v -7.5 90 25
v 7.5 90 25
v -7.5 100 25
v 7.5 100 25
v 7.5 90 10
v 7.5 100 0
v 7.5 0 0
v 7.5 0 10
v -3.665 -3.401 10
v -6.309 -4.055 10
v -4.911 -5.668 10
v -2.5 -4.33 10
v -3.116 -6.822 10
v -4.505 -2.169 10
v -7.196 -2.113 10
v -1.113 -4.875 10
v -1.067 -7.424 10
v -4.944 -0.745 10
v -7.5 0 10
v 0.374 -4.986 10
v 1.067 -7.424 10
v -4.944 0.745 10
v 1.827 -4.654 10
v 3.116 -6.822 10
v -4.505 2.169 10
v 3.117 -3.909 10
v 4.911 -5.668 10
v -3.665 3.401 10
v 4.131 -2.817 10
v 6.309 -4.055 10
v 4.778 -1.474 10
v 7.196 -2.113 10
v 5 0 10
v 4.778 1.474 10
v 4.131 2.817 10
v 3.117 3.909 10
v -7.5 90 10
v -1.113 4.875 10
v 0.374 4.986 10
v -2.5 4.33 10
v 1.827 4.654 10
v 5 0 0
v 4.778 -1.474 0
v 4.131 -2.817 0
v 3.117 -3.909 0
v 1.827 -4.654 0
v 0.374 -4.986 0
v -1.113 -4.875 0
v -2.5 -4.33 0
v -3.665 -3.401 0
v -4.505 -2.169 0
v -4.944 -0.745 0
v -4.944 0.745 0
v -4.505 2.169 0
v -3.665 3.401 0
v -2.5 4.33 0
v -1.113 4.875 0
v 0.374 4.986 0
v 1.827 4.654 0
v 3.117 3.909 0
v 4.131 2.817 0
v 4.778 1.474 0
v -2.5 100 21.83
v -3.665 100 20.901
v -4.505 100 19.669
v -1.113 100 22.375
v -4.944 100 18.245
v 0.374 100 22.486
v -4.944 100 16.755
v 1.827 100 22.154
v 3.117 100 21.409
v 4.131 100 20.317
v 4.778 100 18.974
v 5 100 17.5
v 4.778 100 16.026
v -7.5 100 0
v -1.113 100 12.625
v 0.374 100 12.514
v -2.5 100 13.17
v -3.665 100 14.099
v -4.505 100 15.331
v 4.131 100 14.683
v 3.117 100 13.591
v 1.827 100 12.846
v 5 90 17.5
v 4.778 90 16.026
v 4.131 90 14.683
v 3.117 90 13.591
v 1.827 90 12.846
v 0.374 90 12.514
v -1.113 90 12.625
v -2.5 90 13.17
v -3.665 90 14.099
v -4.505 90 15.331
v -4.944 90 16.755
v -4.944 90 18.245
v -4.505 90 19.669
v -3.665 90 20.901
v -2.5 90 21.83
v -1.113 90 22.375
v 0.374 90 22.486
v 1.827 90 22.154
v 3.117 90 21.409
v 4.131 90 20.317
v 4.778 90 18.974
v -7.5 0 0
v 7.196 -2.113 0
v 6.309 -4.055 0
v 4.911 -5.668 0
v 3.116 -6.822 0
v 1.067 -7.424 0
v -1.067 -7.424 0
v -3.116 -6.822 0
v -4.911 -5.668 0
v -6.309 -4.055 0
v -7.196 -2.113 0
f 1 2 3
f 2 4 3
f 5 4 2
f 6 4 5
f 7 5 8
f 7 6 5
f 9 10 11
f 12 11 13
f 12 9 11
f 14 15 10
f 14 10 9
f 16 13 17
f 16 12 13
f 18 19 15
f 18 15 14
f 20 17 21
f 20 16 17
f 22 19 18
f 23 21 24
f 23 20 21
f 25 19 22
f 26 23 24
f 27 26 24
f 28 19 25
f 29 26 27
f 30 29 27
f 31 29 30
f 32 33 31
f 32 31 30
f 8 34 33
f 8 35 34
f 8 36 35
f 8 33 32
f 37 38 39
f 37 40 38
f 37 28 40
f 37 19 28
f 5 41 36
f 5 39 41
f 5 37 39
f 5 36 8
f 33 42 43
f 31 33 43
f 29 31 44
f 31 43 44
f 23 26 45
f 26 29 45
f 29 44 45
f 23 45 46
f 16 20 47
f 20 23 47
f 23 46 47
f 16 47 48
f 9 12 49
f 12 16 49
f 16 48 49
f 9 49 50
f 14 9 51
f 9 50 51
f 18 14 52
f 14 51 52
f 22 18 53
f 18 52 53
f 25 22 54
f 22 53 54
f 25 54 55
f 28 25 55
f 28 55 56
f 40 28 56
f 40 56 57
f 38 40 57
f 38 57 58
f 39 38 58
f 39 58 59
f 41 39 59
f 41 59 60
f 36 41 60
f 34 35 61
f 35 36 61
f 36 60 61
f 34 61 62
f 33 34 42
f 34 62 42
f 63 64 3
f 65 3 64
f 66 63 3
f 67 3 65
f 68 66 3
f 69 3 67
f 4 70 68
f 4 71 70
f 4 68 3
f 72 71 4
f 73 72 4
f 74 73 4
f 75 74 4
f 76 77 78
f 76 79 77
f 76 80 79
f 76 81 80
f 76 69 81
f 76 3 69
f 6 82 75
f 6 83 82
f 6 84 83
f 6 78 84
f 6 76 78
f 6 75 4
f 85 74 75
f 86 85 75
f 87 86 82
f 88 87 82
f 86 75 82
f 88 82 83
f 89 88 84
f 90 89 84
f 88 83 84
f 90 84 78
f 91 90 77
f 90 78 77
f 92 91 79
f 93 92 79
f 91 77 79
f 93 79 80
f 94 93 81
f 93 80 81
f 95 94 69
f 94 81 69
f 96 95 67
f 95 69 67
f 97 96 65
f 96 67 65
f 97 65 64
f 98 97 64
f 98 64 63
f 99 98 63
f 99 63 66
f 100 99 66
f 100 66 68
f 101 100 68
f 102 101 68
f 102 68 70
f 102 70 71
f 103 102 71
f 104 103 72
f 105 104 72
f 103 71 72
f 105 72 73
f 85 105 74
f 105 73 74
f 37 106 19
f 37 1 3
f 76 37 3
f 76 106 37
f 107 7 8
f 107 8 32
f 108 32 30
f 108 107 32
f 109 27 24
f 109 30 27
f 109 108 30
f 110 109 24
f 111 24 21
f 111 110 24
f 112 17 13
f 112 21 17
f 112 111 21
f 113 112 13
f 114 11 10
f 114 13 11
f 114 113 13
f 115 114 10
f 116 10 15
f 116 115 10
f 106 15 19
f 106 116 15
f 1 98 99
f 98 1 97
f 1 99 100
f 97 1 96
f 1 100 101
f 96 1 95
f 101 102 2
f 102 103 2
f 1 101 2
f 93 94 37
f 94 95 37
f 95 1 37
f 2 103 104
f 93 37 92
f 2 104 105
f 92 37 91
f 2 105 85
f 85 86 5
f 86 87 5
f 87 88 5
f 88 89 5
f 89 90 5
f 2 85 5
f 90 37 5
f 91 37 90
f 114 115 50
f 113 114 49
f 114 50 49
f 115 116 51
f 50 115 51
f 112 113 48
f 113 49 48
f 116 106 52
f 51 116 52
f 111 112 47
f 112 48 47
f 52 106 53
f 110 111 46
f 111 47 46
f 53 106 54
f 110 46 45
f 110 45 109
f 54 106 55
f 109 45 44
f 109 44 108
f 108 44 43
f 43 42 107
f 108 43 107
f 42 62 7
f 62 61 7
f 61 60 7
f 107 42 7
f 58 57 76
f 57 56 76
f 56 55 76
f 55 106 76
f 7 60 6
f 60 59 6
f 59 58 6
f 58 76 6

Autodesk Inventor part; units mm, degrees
ref_plane "YZ Plane" through (0, 0, 0) normal (1, 0, 0) x (0, 1, 0)
ref_plane "XZ Plane" through (0, 0, 0) normal (0, 1, 0) x (-1, 0, 0)
ref_plane "XY Plane" through (0, 0, 0) normal (0, 0, 1) x (1, 0, 0)
sketch "草圖1" plane through (0, 0, 0) normal (0, 0, 1) x (1, 0, 0)
  circle A0 centre (0, 0) radius 5
  line L0 (0, 0) -> (0, 100) construction
  line L1 (-7.5, 0) -> (-7.5, 100)
  line L2 (7.5, 100) -> (7.5, 0)
  arc A1 (-7.5, 0) -> (7.5, 0) centre (0, 0) ccw
  arc A2 (7.5, 100) -> (-7.5, 100) centre (0, 100) ccw
  line L3 (-7.5, 100) -> (7.5, 100)
  point P0 (0, 50)
  dimension "d0" = 10
  dimension "d1" = 15
  dimension "d2" = 100
extrude "擠出1" add sketch "草圖1" along normal blind 10 contours L1 L3 L2 A1
sketch "草圖2" plane through (-7.5, 100, 0) normal (0, 1, 0) x (1, 0, 0)
  line L0 (15, -10) -> (0, -10) projected
  line L1 (15, -25) -> (0, -25)
  line L2 (0, -25) -> (0, -10)
  line L3 (0, -10) -> (15, -10)
  line L4 (15, -10) -> (15, -25)
  line L5 (15, -25) -> (0, -10) construction
  line L6 (0, -25) -> (15, -10) construction
  line L7 (15, 0) -> (15, -10) projected
  circle A0 centre (7.5, -17.5) radius 5
  point P0 (7.5, 0)
  point P1 (15, -10)
  dimension "d13" = 0
  dimension "d14" = 15
  dimension "d15" = 10
extrude "擠出2" add sketch "草圖2" against normal blind 10
